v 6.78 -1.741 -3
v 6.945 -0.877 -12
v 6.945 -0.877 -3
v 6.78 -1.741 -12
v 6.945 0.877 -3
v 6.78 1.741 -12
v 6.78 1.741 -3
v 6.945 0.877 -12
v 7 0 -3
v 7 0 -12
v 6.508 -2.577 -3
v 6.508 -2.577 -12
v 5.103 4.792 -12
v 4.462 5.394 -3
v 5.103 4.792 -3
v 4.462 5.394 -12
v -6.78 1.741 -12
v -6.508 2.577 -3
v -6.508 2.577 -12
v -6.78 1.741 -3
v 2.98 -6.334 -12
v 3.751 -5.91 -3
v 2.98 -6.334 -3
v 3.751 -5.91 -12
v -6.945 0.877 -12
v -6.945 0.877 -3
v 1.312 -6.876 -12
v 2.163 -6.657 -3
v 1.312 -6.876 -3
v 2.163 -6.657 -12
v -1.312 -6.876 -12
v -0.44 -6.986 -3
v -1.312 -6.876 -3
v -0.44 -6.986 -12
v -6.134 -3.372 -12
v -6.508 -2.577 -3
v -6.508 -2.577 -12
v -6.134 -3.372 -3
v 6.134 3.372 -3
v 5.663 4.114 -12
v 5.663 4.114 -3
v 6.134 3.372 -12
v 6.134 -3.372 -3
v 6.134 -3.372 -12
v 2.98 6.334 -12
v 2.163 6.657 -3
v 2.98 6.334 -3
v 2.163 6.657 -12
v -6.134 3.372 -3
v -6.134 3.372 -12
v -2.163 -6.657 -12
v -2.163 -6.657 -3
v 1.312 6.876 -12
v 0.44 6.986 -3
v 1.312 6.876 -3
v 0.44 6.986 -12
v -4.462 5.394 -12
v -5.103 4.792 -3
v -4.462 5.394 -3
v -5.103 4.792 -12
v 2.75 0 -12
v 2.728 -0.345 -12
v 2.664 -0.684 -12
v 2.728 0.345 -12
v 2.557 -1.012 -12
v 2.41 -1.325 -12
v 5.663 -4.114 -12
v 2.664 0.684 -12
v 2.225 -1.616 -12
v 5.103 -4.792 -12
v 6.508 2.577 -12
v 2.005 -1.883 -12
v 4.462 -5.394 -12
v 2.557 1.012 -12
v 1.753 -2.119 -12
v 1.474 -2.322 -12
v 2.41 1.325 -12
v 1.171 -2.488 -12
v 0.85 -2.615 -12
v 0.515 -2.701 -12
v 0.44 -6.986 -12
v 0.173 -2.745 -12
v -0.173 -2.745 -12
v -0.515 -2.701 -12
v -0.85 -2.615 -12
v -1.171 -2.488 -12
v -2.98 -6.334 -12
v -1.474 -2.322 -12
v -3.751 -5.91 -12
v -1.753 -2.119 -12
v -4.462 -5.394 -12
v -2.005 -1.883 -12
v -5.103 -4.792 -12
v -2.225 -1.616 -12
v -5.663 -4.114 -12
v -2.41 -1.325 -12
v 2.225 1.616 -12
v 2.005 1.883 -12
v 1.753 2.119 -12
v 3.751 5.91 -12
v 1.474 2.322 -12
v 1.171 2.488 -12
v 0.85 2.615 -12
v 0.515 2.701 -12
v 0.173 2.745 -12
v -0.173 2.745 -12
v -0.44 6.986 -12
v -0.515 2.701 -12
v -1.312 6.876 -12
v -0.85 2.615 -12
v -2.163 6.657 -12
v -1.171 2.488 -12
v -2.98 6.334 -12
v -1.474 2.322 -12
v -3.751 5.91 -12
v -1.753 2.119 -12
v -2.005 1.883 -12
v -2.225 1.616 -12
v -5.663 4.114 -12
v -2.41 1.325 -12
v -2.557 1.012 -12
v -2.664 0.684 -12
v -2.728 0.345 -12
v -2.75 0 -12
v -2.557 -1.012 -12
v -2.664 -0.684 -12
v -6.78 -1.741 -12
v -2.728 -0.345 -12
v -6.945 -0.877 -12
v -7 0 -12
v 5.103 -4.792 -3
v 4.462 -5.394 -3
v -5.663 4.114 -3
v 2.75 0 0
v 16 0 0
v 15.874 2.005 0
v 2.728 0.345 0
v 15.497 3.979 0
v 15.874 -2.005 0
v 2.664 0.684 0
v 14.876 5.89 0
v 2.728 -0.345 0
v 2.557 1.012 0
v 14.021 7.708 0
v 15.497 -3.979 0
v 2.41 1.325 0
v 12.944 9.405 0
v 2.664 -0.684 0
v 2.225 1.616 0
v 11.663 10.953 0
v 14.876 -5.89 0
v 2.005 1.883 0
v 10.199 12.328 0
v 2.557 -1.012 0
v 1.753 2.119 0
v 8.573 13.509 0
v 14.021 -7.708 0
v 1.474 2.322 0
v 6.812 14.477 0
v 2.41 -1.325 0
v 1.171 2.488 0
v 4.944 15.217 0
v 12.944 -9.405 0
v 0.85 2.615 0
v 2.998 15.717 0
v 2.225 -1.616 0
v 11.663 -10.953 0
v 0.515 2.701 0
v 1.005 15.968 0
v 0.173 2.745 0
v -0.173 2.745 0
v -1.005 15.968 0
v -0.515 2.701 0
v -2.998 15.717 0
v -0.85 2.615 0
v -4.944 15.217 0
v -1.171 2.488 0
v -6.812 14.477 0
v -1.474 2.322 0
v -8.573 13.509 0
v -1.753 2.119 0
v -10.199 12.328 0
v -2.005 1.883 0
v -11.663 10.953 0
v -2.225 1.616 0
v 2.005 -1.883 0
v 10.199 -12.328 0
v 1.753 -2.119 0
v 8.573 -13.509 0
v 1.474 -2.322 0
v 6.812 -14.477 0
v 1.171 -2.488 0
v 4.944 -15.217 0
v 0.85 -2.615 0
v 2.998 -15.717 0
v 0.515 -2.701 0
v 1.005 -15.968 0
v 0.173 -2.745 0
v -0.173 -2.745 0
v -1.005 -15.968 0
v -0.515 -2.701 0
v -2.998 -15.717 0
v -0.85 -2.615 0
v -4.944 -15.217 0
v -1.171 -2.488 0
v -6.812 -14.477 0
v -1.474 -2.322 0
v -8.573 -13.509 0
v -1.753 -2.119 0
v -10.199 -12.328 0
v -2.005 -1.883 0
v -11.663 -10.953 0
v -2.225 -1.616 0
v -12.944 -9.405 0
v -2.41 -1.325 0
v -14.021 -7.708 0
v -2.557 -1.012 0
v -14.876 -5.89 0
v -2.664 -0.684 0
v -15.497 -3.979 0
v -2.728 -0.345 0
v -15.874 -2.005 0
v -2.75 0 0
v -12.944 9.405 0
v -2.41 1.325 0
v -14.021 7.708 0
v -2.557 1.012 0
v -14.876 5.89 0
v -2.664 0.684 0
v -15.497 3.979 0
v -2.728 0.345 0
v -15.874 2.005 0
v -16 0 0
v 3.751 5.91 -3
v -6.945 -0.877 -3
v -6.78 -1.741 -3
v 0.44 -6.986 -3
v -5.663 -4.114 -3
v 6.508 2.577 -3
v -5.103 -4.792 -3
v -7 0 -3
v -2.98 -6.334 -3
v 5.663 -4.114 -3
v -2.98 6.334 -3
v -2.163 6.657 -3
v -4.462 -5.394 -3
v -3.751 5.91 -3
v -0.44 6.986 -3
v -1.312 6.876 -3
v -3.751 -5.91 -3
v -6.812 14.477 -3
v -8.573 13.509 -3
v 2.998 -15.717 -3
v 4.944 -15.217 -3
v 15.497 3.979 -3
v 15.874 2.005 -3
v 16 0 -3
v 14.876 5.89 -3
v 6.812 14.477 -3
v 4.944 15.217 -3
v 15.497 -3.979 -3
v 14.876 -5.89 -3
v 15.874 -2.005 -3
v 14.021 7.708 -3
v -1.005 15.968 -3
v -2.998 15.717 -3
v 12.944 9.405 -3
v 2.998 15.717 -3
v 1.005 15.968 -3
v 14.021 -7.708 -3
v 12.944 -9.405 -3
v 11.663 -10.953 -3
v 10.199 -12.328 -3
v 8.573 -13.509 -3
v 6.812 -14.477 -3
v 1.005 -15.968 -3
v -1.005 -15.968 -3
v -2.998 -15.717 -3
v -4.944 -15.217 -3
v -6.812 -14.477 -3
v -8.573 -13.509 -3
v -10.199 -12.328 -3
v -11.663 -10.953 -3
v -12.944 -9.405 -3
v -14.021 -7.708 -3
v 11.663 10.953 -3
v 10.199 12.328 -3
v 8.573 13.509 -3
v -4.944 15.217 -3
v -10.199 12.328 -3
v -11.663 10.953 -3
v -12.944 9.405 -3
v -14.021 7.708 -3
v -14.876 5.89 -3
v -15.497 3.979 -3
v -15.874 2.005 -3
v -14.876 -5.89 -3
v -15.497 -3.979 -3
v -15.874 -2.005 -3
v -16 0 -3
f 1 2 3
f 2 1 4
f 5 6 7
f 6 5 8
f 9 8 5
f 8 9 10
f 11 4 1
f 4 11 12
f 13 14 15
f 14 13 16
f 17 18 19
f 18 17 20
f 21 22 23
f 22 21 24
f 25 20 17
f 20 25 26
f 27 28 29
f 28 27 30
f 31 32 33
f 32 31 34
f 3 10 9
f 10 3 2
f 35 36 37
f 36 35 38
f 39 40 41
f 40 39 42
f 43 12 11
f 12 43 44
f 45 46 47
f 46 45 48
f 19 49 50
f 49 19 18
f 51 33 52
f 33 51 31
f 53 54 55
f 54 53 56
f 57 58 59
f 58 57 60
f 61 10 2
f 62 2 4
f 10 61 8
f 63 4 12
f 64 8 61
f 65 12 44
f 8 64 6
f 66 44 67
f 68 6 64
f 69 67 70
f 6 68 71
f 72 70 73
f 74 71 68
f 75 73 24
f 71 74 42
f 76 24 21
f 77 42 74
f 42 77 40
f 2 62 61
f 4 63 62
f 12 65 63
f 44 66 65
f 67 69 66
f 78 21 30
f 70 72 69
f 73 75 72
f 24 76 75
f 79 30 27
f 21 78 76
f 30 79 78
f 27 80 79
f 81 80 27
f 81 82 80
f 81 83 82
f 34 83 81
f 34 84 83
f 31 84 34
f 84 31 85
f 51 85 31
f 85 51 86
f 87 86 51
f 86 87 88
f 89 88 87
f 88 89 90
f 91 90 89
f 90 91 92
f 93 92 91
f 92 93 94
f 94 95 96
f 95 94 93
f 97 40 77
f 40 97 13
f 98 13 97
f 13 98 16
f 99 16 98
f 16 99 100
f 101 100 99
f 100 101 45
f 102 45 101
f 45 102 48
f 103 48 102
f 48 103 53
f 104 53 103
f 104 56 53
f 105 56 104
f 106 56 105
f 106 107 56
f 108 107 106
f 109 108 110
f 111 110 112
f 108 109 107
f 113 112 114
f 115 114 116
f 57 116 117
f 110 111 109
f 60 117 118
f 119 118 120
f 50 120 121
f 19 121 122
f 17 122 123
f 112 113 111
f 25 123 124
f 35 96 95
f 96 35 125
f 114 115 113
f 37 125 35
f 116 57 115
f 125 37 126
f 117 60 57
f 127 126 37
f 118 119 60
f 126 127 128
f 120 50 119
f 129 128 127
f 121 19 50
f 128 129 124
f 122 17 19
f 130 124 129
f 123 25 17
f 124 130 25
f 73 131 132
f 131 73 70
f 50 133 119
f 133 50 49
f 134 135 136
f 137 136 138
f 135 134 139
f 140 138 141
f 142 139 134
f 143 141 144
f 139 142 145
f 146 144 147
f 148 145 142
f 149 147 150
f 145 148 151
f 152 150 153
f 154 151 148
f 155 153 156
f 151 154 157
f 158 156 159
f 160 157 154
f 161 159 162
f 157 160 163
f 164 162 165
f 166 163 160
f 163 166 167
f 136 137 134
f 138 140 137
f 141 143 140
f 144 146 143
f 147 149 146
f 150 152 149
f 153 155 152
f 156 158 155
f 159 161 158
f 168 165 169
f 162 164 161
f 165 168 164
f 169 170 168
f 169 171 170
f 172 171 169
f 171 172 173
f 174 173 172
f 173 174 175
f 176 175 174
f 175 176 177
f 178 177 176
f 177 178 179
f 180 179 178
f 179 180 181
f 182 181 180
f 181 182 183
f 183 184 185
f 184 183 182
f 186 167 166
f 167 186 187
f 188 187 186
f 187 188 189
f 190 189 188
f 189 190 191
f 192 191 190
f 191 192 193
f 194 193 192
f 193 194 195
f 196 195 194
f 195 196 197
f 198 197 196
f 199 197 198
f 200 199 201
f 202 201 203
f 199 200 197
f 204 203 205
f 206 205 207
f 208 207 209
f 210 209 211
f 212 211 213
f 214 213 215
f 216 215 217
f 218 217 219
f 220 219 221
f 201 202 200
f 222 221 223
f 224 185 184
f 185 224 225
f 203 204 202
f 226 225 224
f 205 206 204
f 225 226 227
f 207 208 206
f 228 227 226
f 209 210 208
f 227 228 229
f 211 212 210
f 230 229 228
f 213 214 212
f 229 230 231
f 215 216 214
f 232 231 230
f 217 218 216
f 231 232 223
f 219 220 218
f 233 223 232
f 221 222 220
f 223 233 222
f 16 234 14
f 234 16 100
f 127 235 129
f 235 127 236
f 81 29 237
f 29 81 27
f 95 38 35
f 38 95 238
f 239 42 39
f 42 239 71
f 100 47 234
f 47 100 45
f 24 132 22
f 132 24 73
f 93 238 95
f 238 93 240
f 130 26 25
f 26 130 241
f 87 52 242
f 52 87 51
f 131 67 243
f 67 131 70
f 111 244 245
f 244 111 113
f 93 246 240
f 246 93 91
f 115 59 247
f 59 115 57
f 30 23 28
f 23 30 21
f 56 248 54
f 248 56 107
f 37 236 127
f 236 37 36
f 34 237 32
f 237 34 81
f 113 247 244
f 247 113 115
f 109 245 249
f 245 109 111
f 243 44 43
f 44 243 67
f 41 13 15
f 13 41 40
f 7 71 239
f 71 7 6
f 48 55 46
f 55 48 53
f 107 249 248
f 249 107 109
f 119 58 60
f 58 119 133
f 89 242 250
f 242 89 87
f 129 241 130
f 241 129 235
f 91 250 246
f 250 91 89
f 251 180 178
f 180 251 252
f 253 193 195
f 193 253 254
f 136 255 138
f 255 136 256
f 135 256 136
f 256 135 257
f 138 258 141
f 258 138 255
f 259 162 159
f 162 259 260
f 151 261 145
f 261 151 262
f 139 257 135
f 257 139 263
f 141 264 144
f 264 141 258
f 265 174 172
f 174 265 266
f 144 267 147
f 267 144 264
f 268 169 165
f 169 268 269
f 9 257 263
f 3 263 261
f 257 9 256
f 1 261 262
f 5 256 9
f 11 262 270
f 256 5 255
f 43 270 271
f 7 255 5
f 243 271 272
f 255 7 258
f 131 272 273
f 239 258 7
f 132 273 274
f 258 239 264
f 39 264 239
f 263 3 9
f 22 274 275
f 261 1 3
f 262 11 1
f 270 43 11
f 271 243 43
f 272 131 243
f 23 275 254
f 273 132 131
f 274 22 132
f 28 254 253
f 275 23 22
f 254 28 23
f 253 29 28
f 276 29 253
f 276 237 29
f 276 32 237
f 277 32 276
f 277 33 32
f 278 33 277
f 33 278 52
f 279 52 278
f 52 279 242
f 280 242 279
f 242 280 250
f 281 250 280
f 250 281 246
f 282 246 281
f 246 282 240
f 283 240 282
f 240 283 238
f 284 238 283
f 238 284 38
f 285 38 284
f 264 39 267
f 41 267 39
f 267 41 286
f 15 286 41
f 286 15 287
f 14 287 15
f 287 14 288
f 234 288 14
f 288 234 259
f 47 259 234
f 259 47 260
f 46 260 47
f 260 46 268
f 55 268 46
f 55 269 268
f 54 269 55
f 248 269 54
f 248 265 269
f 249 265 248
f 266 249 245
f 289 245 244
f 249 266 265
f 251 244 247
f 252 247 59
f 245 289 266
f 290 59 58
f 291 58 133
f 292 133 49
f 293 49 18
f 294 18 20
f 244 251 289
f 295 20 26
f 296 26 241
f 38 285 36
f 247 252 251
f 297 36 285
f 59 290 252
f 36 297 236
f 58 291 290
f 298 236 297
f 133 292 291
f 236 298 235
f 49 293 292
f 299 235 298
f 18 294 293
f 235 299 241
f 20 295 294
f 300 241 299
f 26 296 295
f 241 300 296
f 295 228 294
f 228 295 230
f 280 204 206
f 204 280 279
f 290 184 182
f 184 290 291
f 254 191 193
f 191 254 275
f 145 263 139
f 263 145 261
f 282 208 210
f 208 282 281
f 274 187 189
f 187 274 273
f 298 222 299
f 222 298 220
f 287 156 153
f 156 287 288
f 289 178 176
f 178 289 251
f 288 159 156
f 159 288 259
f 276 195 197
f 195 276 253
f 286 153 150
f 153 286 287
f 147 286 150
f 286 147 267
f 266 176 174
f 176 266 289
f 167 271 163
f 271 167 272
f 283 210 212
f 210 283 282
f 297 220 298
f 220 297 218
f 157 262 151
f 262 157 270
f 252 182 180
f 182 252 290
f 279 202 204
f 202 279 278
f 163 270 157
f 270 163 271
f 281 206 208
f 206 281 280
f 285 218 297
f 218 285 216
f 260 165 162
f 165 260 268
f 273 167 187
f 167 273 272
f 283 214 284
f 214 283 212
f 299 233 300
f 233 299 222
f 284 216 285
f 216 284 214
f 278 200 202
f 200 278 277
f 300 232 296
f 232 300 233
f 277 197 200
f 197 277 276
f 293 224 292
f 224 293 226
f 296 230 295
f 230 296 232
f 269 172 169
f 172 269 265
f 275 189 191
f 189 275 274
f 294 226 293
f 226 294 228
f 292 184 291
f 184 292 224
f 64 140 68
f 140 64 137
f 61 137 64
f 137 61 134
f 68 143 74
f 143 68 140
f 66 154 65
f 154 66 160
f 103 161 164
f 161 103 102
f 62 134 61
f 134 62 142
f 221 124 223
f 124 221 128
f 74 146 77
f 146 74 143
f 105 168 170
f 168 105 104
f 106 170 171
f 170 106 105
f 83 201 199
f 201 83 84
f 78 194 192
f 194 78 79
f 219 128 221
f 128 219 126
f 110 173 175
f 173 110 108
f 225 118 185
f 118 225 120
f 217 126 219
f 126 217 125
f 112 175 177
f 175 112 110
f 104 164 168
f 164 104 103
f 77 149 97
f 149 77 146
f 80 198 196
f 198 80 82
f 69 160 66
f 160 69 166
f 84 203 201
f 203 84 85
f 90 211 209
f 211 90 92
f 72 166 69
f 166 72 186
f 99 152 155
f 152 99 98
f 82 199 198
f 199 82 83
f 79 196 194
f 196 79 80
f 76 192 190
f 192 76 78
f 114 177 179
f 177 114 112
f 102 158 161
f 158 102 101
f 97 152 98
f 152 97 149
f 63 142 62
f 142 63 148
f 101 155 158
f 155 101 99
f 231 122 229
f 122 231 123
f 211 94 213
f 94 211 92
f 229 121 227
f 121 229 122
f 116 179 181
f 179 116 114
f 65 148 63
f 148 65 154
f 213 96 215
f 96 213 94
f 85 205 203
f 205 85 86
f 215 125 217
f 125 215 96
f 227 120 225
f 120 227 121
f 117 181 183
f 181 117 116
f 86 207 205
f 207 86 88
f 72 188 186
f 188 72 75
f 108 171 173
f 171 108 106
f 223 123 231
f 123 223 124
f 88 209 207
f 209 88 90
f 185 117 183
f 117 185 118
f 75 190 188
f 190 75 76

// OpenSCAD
$fn = 50;


difference() {
	union() {
		translate(v = [0, 0, -12.0000000000]) {
			cylinder(h = 12, r = 7.0000000000);
		}
		translate(v = [0, 0, -3.0000000000]) {
			cylinder(h = 3, r = 16.0000000000);
		}
	}
	union() {
		#translate(v = [0, 0, -12]) {
			cylinder(h = 12, r = 2.7500000000);
		}
	}
}
